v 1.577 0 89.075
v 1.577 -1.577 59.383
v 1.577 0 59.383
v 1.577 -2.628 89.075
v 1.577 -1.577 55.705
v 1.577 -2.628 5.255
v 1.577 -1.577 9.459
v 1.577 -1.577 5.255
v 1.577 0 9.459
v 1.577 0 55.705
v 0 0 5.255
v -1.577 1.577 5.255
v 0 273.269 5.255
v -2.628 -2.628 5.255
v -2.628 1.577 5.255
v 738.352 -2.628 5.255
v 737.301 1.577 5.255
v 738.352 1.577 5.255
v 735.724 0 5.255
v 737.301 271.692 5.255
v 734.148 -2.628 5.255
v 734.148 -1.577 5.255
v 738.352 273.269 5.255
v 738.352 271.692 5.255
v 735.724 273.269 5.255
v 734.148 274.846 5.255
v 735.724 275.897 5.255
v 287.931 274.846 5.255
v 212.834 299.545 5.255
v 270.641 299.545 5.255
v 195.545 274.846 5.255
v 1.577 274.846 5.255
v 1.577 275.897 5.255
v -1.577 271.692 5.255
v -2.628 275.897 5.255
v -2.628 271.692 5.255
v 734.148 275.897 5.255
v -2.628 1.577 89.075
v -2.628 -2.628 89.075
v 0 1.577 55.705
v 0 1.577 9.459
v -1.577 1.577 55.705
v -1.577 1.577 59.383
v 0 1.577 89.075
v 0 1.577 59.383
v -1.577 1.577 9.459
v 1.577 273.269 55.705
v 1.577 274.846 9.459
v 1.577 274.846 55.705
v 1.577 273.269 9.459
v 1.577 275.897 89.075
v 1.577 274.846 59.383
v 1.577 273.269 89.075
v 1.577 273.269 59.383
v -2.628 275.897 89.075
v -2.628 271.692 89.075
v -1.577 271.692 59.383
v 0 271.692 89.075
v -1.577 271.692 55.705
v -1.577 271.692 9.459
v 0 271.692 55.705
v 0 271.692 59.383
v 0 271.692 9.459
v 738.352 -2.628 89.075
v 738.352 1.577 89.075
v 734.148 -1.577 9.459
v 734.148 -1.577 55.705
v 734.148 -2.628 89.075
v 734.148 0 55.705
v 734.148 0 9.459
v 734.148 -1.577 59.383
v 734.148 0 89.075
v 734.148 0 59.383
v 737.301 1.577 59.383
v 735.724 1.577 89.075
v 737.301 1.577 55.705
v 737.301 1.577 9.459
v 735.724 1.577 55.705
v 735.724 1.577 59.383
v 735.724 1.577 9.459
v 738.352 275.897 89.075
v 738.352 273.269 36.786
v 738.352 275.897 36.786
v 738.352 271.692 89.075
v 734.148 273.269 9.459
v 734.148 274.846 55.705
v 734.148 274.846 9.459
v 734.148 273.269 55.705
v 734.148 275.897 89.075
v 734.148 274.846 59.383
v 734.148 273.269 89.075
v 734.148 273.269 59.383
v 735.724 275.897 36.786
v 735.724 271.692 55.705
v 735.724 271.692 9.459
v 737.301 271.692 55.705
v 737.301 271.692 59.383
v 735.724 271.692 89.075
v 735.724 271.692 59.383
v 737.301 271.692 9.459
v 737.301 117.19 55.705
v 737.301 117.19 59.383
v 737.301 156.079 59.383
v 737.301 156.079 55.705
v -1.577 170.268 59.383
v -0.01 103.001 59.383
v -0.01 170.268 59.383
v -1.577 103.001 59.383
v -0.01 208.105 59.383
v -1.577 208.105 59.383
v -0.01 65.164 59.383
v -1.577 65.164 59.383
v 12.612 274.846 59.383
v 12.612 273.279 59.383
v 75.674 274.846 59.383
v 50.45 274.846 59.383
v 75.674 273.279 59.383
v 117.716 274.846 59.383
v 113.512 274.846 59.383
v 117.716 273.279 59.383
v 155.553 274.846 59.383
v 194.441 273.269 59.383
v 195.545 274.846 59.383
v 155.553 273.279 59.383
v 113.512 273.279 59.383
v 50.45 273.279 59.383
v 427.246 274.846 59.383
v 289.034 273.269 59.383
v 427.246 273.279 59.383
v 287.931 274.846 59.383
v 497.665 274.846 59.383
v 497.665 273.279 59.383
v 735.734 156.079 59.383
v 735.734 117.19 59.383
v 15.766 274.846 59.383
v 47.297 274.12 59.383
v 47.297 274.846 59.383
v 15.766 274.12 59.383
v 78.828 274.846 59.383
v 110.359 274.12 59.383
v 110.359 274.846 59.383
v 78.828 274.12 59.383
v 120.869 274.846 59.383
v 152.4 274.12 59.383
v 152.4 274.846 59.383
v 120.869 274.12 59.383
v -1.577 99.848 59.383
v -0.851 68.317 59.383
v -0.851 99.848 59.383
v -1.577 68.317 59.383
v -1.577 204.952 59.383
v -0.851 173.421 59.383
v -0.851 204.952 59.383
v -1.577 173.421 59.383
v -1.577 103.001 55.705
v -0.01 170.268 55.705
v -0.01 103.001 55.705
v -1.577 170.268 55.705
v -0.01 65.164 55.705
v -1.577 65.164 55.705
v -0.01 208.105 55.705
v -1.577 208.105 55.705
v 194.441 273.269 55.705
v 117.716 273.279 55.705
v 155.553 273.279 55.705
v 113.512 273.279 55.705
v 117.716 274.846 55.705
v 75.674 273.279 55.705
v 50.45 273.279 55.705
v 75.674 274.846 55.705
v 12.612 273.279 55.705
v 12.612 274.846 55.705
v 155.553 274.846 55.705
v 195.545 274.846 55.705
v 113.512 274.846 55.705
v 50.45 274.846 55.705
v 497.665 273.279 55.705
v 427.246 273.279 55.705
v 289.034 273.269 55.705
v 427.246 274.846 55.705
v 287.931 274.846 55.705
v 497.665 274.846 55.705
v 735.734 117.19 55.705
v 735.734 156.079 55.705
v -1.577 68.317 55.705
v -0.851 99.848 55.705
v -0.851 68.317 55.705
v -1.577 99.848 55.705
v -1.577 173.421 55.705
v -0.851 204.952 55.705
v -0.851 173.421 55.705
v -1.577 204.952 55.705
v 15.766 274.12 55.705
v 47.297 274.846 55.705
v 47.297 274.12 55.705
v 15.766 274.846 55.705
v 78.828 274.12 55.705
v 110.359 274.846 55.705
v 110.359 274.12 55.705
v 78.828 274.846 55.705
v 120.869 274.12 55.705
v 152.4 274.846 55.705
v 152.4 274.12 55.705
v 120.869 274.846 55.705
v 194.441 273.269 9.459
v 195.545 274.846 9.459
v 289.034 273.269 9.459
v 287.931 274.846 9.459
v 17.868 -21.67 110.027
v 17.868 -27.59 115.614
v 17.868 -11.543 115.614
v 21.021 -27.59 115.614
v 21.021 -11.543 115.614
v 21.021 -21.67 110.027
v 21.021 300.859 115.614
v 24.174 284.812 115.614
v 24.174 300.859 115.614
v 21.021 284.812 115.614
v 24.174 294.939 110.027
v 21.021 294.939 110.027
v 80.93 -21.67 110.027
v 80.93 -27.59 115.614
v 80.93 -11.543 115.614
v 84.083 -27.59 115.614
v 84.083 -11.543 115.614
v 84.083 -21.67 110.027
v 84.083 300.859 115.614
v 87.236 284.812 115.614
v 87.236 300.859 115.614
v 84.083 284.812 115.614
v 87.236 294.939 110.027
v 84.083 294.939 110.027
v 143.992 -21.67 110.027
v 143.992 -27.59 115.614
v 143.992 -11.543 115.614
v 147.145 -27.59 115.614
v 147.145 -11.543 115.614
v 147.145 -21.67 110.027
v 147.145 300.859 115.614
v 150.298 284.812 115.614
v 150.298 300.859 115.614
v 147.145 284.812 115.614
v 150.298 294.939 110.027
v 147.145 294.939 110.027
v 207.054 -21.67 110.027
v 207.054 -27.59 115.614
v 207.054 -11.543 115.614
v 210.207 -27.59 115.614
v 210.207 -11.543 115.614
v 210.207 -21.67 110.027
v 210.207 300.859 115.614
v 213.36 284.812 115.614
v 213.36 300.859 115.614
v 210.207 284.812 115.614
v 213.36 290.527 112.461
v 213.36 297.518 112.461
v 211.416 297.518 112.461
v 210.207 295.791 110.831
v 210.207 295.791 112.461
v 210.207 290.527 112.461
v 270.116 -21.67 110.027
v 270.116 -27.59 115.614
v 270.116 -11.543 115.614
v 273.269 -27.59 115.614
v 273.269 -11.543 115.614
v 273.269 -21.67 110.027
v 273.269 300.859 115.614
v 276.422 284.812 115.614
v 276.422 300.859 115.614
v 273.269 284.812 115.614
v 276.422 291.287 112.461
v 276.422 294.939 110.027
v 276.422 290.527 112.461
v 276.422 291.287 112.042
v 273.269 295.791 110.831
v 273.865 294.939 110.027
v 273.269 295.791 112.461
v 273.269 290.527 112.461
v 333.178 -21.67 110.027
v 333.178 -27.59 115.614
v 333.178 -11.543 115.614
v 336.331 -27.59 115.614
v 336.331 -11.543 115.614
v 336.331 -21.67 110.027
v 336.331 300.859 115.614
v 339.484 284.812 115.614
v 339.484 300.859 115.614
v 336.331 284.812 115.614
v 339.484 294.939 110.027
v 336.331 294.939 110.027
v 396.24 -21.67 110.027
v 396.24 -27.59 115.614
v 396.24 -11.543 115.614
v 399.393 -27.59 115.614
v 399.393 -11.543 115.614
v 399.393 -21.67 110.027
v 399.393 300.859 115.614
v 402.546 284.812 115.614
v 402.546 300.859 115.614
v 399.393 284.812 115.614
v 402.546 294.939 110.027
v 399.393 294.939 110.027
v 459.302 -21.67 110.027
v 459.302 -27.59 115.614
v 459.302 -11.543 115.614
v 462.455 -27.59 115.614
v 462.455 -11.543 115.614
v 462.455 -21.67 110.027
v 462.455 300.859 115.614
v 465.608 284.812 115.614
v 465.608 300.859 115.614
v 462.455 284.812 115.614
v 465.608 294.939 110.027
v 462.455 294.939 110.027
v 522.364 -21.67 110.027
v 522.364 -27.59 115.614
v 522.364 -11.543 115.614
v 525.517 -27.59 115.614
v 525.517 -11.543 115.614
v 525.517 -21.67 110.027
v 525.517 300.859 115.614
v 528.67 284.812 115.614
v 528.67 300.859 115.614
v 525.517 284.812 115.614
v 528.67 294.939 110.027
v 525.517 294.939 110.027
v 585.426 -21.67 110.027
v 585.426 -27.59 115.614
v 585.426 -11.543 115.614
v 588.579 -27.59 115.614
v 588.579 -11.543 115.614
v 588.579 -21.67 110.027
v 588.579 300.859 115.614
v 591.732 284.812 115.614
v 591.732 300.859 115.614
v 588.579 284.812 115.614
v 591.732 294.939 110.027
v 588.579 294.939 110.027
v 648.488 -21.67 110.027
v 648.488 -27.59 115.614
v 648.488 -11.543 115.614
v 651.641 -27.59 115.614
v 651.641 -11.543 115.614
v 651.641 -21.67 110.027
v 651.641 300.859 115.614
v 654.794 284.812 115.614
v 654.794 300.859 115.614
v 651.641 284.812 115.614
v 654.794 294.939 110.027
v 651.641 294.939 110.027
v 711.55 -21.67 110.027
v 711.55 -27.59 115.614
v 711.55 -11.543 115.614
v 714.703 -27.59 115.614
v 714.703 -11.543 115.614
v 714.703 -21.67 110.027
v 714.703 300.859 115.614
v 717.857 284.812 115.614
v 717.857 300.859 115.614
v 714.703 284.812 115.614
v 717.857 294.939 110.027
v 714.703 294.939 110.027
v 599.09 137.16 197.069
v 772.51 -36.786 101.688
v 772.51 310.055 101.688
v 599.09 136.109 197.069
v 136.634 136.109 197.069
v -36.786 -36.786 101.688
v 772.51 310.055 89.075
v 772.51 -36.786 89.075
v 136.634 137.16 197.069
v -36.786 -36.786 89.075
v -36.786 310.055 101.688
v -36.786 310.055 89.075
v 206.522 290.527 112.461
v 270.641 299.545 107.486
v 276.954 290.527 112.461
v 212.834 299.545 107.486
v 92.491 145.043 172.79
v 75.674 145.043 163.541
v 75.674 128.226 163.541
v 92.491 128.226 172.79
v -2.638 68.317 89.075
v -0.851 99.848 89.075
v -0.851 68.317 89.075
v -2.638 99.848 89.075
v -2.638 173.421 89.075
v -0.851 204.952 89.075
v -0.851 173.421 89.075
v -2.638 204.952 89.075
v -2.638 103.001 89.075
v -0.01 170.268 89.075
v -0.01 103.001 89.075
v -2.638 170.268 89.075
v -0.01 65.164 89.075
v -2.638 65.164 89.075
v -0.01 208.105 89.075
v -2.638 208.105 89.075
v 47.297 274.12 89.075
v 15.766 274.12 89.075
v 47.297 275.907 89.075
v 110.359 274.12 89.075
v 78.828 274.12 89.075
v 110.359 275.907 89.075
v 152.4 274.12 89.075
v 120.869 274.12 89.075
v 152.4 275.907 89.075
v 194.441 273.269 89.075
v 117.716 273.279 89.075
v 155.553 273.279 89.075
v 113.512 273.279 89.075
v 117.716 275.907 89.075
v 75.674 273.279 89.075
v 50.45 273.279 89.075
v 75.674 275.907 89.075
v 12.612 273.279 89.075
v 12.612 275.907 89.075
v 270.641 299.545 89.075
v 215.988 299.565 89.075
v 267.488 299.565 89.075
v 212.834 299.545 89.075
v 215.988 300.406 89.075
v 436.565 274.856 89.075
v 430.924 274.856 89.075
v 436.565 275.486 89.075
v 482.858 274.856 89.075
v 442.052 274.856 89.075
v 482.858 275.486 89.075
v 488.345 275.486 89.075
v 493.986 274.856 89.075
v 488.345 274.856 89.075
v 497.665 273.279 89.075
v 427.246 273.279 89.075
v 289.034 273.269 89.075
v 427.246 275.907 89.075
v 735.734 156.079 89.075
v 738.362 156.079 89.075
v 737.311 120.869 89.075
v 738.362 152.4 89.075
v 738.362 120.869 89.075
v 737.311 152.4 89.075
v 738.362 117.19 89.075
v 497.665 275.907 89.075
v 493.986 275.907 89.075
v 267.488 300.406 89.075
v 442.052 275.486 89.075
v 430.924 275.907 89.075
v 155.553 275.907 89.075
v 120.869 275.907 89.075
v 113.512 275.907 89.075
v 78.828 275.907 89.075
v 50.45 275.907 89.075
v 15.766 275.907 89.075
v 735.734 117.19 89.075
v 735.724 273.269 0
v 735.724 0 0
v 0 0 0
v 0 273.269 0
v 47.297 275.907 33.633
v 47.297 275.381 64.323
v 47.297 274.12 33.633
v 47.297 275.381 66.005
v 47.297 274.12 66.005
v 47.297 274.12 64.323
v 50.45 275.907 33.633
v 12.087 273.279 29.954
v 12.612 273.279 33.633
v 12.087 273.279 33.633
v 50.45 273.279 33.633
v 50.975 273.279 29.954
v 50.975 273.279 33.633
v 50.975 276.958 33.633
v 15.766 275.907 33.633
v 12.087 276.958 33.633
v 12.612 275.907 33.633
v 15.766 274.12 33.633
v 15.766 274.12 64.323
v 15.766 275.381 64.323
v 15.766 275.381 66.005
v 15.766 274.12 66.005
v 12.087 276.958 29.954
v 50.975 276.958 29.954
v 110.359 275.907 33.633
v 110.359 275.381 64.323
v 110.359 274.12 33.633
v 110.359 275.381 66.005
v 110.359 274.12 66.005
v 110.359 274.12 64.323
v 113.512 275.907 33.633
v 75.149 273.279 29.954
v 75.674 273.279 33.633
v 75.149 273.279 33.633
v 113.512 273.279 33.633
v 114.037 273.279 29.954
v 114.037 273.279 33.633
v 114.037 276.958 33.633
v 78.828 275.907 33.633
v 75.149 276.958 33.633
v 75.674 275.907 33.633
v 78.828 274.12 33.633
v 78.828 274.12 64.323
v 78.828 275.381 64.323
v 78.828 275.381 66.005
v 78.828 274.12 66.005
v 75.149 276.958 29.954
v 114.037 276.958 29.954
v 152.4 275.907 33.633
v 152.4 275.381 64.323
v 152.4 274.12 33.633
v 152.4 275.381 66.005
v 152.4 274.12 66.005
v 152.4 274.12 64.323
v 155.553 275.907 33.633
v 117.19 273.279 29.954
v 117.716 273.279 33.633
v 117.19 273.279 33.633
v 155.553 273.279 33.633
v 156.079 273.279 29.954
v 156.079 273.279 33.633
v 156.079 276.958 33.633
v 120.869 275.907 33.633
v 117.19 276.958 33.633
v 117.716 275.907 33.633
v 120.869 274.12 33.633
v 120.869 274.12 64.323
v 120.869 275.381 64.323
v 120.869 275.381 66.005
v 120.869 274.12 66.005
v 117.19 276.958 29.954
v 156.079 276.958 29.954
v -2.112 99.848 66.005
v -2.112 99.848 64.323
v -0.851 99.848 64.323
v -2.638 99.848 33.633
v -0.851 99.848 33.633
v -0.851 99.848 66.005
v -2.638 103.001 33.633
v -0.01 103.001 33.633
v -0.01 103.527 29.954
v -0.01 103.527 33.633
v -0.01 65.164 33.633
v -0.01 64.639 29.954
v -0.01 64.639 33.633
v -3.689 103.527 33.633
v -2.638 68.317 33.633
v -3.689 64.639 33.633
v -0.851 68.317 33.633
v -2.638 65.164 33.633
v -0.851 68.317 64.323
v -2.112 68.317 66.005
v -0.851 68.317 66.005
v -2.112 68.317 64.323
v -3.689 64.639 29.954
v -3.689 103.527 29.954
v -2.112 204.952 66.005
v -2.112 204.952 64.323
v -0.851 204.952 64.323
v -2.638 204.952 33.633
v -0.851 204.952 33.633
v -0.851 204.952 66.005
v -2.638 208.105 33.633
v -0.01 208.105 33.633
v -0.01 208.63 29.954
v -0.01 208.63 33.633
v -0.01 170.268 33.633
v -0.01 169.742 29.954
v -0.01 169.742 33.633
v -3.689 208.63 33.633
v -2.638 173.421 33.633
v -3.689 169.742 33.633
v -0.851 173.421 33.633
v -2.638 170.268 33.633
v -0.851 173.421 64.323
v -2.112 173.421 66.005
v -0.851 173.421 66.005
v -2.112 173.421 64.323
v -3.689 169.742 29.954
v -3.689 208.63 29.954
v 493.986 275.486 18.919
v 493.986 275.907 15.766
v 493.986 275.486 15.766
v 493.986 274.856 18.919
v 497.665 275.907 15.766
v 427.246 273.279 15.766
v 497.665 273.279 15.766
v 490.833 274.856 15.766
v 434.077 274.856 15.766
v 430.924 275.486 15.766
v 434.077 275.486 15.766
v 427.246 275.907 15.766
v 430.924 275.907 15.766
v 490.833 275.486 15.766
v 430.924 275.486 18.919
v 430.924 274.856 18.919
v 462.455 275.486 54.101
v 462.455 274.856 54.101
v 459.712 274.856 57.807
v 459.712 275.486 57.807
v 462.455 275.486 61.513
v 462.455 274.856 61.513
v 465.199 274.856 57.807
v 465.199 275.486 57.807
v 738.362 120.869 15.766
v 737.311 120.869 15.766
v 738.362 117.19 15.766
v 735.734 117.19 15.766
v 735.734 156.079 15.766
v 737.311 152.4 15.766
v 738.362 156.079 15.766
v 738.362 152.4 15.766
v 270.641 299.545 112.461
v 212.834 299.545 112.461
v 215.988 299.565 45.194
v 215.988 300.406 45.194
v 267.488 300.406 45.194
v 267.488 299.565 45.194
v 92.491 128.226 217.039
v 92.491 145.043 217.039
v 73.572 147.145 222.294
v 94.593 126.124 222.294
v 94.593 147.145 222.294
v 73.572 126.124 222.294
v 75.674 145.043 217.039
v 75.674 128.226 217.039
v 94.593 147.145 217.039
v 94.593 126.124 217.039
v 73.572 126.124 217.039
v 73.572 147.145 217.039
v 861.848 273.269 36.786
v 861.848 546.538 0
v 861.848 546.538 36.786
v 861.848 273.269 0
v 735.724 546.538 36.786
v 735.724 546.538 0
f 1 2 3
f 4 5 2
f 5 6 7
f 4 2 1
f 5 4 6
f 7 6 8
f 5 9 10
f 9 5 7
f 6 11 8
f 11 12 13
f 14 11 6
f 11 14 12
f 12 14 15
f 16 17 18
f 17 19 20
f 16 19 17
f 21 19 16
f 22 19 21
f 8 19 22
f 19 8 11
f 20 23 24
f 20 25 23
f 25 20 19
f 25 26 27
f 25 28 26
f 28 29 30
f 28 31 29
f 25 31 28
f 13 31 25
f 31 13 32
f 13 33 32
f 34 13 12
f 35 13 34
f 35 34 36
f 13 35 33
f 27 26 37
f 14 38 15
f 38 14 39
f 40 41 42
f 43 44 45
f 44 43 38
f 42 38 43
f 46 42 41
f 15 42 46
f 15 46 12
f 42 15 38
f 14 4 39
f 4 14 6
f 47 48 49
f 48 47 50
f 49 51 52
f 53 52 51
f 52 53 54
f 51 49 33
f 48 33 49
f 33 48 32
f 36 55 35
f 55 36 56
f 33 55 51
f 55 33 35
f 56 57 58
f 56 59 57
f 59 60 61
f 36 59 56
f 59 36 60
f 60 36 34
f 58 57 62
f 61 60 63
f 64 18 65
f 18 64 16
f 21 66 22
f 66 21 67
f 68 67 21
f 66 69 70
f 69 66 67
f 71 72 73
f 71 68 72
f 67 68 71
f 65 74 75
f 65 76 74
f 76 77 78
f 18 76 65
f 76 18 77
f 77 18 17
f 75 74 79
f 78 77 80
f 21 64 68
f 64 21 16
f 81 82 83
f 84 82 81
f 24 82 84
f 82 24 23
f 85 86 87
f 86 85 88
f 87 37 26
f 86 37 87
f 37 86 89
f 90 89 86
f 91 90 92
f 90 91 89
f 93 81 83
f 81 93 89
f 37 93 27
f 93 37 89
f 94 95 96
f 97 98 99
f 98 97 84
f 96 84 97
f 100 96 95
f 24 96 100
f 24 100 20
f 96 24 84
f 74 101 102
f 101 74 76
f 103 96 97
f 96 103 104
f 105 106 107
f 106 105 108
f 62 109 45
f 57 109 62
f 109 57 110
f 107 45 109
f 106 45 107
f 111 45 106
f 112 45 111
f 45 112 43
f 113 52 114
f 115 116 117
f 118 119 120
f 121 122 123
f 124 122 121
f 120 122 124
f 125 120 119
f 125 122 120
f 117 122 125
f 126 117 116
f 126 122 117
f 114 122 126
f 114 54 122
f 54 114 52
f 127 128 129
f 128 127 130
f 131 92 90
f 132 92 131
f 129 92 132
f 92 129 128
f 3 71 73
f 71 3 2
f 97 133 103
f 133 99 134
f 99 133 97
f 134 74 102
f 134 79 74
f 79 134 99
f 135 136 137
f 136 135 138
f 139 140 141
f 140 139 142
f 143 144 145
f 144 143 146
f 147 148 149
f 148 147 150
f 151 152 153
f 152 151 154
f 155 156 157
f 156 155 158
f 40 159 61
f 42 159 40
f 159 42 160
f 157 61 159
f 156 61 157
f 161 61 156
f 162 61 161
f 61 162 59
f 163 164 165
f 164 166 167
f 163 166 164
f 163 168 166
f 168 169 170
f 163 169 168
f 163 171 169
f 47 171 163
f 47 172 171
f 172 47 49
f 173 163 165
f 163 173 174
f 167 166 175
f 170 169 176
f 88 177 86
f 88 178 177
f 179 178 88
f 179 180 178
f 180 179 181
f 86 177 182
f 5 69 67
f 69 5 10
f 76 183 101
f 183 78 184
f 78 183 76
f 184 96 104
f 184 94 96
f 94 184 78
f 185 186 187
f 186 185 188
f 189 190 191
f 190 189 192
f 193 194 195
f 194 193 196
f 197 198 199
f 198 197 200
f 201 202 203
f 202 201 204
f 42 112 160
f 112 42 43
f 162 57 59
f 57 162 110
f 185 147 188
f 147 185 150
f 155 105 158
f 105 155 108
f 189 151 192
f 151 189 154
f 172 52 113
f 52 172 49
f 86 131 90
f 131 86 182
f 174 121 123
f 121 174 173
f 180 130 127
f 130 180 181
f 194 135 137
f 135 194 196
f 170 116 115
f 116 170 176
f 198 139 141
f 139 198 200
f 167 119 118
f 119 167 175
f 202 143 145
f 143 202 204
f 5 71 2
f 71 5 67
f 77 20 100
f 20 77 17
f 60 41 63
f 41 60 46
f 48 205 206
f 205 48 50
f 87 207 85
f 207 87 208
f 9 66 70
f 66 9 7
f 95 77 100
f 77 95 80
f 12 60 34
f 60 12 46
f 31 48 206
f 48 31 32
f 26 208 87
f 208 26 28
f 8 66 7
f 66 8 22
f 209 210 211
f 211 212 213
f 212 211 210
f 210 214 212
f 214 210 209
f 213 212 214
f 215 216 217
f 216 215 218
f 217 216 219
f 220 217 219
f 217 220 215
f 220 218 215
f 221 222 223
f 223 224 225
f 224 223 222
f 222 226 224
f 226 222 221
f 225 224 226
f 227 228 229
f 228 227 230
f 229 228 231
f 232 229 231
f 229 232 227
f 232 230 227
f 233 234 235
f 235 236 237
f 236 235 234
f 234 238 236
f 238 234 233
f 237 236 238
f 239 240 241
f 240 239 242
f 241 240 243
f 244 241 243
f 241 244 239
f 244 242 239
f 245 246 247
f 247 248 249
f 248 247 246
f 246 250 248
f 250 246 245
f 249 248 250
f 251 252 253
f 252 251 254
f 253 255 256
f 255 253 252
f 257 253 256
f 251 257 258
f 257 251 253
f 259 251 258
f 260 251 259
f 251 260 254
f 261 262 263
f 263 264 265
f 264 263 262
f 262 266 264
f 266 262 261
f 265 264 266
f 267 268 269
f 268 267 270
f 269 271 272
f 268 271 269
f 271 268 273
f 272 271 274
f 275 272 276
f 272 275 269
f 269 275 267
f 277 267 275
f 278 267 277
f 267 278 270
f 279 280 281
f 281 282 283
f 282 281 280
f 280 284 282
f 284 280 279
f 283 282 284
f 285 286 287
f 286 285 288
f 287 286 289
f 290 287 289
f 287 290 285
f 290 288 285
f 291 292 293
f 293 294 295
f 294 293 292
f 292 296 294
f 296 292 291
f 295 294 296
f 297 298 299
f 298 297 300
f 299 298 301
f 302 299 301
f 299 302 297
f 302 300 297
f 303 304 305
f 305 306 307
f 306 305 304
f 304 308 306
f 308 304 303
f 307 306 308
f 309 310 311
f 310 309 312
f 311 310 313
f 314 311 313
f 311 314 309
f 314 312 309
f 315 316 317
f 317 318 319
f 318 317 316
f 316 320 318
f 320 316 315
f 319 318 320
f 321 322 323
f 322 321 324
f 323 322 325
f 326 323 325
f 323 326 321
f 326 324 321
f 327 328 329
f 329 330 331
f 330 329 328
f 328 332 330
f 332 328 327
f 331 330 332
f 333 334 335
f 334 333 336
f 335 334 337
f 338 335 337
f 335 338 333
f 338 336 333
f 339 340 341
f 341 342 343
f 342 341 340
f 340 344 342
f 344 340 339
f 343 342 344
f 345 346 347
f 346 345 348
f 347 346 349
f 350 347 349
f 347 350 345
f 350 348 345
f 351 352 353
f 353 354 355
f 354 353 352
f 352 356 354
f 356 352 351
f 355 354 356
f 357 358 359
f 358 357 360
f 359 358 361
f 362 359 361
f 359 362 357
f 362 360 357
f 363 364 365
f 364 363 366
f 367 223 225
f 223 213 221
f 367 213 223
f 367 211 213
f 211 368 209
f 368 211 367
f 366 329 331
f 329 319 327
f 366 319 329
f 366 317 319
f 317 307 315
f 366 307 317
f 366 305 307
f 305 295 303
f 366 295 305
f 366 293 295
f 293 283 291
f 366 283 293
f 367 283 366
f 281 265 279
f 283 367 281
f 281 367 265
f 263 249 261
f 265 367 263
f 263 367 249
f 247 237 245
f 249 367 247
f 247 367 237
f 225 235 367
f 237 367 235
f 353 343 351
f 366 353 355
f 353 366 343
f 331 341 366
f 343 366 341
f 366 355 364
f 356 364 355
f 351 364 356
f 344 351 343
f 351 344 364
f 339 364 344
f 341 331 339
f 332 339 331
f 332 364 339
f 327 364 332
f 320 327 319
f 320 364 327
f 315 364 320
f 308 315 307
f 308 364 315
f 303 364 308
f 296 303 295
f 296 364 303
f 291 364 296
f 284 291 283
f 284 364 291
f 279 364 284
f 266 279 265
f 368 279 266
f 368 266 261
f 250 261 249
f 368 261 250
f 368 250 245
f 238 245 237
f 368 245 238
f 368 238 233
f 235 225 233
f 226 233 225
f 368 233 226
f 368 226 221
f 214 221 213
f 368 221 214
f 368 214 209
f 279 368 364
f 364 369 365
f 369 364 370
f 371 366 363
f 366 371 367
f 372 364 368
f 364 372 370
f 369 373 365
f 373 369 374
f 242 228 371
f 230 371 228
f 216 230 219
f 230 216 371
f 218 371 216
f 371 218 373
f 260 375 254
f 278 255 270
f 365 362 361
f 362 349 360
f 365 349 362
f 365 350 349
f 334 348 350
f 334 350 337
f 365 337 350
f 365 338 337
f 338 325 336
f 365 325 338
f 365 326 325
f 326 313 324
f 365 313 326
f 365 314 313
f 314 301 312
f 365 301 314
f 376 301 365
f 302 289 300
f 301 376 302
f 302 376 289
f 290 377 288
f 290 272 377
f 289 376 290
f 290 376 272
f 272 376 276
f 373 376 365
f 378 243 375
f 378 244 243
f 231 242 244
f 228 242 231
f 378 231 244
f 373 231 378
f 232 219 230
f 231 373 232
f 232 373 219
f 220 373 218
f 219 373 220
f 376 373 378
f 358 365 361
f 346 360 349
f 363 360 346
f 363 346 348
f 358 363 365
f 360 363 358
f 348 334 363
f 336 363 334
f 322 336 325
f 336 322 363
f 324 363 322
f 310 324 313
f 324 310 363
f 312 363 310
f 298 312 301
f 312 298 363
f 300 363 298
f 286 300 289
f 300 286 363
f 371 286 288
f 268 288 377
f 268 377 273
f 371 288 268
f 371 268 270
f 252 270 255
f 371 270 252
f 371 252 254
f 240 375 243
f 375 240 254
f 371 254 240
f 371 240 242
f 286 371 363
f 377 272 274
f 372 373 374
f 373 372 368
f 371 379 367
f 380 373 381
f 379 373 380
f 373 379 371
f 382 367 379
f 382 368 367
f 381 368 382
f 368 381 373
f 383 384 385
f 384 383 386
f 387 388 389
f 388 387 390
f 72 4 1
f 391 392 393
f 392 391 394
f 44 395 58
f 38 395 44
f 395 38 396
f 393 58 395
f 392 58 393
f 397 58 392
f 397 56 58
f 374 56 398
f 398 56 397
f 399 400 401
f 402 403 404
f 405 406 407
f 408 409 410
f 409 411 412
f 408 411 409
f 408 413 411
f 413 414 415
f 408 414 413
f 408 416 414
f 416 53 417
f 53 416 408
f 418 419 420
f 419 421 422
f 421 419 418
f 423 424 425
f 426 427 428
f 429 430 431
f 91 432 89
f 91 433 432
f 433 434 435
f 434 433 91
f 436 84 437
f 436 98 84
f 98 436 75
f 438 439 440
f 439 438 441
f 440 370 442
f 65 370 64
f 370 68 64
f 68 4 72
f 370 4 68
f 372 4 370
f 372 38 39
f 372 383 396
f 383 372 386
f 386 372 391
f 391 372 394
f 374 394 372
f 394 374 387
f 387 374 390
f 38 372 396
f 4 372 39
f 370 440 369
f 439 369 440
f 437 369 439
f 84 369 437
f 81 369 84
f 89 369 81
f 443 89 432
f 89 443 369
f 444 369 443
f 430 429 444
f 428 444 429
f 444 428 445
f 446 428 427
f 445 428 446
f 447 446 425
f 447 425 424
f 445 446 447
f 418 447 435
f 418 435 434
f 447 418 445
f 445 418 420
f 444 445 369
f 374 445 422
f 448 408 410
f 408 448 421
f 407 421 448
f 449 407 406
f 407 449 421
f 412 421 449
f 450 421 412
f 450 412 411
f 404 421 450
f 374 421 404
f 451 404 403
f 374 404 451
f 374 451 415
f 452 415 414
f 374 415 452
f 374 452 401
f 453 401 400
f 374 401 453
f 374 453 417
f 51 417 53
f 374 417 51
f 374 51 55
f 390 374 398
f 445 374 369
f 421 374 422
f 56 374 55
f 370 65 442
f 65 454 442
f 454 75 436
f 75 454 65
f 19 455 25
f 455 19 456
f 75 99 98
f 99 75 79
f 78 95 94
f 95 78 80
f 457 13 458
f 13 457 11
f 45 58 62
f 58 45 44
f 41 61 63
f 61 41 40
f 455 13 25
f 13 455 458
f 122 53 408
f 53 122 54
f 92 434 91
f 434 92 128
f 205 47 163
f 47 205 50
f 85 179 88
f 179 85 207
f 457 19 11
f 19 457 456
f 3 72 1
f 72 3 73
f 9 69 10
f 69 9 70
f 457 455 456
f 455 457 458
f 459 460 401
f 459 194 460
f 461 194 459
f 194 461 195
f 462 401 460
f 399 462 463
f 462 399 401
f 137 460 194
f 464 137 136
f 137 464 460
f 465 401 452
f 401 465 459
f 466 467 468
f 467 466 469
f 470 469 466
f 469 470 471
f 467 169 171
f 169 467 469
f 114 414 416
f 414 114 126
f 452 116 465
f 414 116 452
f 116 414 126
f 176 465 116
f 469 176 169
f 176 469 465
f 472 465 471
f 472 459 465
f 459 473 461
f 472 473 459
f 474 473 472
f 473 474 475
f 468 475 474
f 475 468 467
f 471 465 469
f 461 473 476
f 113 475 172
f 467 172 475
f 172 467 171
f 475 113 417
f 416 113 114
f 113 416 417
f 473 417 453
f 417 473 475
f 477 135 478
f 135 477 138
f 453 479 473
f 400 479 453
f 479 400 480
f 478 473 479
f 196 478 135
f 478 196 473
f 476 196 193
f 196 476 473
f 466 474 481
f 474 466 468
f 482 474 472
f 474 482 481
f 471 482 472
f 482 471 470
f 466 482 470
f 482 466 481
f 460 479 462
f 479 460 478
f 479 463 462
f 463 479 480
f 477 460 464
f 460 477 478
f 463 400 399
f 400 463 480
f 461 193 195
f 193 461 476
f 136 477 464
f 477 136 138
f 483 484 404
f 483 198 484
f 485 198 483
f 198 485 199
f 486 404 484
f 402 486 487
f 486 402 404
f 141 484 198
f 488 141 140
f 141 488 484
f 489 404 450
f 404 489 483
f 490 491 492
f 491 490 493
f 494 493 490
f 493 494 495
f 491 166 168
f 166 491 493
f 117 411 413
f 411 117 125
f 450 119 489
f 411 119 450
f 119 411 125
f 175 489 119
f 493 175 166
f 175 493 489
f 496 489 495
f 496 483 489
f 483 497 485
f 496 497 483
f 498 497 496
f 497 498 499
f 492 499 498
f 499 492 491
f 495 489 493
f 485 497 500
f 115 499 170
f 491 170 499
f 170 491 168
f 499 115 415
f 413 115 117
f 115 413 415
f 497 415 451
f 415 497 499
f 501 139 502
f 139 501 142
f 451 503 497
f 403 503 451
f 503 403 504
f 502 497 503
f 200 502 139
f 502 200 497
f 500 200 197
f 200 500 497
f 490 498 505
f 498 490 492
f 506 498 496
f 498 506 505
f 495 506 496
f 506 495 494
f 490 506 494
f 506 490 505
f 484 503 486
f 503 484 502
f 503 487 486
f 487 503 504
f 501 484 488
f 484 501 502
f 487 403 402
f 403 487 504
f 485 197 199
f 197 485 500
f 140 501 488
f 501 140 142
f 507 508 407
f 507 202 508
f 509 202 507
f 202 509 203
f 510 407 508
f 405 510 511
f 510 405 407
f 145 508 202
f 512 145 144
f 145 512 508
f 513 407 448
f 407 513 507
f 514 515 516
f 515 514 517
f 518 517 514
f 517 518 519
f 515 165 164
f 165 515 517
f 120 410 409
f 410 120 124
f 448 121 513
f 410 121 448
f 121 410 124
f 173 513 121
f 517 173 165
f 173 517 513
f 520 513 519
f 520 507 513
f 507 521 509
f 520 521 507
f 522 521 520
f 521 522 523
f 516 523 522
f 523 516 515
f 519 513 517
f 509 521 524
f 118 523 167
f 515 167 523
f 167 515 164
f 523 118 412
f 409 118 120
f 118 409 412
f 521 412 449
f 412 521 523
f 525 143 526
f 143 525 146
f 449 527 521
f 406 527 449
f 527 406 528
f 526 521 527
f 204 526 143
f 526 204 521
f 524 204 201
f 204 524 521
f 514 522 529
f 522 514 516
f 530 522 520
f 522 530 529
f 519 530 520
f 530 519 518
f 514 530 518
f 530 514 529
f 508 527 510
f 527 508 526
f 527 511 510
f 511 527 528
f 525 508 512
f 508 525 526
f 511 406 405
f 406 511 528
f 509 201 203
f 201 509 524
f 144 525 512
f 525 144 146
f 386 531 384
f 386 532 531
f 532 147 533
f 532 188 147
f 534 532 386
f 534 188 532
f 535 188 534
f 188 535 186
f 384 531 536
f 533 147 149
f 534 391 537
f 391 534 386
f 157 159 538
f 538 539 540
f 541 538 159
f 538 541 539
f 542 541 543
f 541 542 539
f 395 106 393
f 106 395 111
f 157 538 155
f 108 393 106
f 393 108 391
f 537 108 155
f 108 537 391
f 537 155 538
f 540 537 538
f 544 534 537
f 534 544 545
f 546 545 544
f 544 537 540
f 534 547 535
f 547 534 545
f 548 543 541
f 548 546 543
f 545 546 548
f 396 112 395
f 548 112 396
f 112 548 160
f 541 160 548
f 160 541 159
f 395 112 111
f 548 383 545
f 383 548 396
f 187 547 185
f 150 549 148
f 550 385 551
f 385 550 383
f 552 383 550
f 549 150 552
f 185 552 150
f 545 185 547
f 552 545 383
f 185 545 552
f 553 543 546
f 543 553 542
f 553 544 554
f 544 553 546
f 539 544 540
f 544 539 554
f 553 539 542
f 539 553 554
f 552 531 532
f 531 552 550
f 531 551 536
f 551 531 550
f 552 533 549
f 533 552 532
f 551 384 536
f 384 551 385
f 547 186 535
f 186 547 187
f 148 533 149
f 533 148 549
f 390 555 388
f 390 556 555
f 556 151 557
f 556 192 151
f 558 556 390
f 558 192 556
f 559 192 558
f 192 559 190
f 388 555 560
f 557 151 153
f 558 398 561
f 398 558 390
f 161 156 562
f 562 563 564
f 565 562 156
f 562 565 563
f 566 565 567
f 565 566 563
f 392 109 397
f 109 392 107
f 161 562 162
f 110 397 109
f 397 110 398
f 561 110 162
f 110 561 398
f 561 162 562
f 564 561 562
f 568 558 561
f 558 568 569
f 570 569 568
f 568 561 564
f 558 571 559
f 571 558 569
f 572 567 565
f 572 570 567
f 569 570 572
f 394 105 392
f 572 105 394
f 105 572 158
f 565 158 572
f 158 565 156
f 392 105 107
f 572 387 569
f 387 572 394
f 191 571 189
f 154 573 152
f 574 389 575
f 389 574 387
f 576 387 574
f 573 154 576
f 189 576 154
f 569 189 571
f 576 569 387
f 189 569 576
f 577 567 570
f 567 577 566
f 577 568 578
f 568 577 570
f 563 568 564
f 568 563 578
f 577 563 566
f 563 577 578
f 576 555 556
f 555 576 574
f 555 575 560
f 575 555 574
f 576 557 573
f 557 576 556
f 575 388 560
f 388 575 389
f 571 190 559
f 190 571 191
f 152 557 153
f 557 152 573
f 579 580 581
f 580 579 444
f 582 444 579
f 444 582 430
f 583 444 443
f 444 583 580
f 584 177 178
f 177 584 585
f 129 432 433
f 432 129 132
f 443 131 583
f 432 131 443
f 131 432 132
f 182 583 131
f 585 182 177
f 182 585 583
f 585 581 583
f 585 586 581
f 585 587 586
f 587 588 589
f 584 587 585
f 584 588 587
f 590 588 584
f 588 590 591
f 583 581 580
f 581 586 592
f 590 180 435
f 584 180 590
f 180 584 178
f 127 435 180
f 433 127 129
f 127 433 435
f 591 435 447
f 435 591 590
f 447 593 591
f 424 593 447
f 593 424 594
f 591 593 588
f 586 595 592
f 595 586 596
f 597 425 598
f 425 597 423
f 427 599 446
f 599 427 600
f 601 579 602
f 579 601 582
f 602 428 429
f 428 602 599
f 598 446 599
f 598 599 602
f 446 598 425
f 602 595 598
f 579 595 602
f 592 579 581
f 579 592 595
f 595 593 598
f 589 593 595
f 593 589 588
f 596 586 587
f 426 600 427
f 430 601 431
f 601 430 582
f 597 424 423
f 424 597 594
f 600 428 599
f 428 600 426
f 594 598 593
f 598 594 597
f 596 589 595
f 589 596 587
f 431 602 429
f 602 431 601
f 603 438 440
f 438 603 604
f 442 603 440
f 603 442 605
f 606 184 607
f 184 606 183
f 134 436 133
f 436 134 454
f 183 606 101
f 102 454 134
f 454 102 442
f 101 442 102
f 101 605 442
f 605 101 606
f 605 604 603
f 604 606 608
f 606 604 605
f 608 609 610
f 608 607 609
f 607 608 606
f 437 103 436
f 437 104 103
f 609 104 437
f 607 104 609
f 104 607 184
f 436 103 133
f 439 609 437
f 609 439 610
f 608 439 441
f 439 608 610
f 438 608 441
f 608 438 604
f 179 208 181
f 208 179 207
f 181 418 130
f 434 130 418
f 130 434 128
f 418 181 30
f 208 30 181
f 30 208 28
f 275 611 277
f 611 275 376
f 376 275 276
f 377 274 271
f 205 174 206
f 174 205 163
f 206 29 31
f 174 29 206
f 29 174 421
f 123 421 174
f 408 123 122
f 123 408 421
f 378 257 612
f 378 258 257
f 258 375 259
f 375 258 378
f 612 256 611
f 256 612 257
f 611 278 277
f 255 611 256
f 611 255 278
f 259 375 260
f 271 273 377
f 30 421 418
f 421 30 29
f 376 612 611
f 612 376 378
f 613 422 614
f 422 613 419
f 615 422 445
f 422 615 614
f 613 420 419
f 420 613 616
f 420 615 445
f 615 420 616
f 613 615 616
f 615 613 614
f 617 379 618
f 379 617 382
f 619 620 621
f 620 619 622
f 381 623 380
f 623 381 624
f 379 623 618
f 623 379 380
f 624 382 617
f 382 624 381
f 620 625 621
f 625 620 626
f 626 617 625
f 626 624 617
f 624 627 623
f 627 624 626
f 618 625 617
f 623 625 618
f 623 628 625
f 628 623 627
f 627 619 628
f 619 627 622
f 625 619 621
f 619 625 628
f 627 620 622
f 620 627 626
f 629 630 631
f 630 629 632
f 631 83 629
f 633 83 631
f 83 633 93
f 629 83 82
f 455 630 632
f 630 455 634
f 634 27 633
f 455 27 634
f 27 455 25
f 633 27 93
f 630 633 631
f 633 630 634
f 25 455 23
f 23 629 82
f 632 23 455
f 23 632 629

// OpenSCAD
// =====================================================================
//  MILWAUKEE ROAD - STANDARD 26 X 70 FT PASSENGER AND FREIGHT DEPOT, GUTTENBERG, IOWA (C.M.&ST.P., NOV 1898)
//  Album of Depot Plans (1919), sheet 10. Private reference (in copyright):
//  Research Library / RSW / Stations / Standard depots / Album of Depot Plans 1919.
//  Rib Side Works, 24 Nov 2026. FIRST SHAPE MODEL for review - not cut into print sections.
//  KNOWN (from the sheet): 26 x 70 ft; two waiting rooms 17 ft 4, office 11 with bay, freight room 39 ft (low and high floors) with a high platform; hipped shingle roof with cresting, lap siding over drop siding.
//  ESTIMATE: wall and ridge heights (sheets are small copies), window spacing, colours.
//  Shared depot builder ../../../_common/rsw_depot.scad (x along the track, y = 0 town side,
//  track side +y, feet).  SCALE: 29 = G, 48 = O, 87 = HO.
// =====================================================================
SCALE = 29;
include <../../../_common/rsw_depot.scad>

depot(blocks = [[0, 70, 0, 26, 11, 0.55, 0, 3.5, 0]],
      pavs   = [],
      wins   = [[3, 1, 3, 6, 3.2], [9, 1, 3, 6, 3.2], [13, 1, 3, 6, 3.2], [8, 2, 3, 6, 3.2], [18, 2, 3, 6, 3.2]],
      doors  = [[24, 1, 3, 7.5, 0], [44, 1, 6, 8, 2], [13, 3, 3, 7.5, 0]],
      bays   = [[23, 1, 9, 2.5]],
      chims  = [[8, 13, 21.15]],
      plat   = [70, 12, 26, 3.5]);
